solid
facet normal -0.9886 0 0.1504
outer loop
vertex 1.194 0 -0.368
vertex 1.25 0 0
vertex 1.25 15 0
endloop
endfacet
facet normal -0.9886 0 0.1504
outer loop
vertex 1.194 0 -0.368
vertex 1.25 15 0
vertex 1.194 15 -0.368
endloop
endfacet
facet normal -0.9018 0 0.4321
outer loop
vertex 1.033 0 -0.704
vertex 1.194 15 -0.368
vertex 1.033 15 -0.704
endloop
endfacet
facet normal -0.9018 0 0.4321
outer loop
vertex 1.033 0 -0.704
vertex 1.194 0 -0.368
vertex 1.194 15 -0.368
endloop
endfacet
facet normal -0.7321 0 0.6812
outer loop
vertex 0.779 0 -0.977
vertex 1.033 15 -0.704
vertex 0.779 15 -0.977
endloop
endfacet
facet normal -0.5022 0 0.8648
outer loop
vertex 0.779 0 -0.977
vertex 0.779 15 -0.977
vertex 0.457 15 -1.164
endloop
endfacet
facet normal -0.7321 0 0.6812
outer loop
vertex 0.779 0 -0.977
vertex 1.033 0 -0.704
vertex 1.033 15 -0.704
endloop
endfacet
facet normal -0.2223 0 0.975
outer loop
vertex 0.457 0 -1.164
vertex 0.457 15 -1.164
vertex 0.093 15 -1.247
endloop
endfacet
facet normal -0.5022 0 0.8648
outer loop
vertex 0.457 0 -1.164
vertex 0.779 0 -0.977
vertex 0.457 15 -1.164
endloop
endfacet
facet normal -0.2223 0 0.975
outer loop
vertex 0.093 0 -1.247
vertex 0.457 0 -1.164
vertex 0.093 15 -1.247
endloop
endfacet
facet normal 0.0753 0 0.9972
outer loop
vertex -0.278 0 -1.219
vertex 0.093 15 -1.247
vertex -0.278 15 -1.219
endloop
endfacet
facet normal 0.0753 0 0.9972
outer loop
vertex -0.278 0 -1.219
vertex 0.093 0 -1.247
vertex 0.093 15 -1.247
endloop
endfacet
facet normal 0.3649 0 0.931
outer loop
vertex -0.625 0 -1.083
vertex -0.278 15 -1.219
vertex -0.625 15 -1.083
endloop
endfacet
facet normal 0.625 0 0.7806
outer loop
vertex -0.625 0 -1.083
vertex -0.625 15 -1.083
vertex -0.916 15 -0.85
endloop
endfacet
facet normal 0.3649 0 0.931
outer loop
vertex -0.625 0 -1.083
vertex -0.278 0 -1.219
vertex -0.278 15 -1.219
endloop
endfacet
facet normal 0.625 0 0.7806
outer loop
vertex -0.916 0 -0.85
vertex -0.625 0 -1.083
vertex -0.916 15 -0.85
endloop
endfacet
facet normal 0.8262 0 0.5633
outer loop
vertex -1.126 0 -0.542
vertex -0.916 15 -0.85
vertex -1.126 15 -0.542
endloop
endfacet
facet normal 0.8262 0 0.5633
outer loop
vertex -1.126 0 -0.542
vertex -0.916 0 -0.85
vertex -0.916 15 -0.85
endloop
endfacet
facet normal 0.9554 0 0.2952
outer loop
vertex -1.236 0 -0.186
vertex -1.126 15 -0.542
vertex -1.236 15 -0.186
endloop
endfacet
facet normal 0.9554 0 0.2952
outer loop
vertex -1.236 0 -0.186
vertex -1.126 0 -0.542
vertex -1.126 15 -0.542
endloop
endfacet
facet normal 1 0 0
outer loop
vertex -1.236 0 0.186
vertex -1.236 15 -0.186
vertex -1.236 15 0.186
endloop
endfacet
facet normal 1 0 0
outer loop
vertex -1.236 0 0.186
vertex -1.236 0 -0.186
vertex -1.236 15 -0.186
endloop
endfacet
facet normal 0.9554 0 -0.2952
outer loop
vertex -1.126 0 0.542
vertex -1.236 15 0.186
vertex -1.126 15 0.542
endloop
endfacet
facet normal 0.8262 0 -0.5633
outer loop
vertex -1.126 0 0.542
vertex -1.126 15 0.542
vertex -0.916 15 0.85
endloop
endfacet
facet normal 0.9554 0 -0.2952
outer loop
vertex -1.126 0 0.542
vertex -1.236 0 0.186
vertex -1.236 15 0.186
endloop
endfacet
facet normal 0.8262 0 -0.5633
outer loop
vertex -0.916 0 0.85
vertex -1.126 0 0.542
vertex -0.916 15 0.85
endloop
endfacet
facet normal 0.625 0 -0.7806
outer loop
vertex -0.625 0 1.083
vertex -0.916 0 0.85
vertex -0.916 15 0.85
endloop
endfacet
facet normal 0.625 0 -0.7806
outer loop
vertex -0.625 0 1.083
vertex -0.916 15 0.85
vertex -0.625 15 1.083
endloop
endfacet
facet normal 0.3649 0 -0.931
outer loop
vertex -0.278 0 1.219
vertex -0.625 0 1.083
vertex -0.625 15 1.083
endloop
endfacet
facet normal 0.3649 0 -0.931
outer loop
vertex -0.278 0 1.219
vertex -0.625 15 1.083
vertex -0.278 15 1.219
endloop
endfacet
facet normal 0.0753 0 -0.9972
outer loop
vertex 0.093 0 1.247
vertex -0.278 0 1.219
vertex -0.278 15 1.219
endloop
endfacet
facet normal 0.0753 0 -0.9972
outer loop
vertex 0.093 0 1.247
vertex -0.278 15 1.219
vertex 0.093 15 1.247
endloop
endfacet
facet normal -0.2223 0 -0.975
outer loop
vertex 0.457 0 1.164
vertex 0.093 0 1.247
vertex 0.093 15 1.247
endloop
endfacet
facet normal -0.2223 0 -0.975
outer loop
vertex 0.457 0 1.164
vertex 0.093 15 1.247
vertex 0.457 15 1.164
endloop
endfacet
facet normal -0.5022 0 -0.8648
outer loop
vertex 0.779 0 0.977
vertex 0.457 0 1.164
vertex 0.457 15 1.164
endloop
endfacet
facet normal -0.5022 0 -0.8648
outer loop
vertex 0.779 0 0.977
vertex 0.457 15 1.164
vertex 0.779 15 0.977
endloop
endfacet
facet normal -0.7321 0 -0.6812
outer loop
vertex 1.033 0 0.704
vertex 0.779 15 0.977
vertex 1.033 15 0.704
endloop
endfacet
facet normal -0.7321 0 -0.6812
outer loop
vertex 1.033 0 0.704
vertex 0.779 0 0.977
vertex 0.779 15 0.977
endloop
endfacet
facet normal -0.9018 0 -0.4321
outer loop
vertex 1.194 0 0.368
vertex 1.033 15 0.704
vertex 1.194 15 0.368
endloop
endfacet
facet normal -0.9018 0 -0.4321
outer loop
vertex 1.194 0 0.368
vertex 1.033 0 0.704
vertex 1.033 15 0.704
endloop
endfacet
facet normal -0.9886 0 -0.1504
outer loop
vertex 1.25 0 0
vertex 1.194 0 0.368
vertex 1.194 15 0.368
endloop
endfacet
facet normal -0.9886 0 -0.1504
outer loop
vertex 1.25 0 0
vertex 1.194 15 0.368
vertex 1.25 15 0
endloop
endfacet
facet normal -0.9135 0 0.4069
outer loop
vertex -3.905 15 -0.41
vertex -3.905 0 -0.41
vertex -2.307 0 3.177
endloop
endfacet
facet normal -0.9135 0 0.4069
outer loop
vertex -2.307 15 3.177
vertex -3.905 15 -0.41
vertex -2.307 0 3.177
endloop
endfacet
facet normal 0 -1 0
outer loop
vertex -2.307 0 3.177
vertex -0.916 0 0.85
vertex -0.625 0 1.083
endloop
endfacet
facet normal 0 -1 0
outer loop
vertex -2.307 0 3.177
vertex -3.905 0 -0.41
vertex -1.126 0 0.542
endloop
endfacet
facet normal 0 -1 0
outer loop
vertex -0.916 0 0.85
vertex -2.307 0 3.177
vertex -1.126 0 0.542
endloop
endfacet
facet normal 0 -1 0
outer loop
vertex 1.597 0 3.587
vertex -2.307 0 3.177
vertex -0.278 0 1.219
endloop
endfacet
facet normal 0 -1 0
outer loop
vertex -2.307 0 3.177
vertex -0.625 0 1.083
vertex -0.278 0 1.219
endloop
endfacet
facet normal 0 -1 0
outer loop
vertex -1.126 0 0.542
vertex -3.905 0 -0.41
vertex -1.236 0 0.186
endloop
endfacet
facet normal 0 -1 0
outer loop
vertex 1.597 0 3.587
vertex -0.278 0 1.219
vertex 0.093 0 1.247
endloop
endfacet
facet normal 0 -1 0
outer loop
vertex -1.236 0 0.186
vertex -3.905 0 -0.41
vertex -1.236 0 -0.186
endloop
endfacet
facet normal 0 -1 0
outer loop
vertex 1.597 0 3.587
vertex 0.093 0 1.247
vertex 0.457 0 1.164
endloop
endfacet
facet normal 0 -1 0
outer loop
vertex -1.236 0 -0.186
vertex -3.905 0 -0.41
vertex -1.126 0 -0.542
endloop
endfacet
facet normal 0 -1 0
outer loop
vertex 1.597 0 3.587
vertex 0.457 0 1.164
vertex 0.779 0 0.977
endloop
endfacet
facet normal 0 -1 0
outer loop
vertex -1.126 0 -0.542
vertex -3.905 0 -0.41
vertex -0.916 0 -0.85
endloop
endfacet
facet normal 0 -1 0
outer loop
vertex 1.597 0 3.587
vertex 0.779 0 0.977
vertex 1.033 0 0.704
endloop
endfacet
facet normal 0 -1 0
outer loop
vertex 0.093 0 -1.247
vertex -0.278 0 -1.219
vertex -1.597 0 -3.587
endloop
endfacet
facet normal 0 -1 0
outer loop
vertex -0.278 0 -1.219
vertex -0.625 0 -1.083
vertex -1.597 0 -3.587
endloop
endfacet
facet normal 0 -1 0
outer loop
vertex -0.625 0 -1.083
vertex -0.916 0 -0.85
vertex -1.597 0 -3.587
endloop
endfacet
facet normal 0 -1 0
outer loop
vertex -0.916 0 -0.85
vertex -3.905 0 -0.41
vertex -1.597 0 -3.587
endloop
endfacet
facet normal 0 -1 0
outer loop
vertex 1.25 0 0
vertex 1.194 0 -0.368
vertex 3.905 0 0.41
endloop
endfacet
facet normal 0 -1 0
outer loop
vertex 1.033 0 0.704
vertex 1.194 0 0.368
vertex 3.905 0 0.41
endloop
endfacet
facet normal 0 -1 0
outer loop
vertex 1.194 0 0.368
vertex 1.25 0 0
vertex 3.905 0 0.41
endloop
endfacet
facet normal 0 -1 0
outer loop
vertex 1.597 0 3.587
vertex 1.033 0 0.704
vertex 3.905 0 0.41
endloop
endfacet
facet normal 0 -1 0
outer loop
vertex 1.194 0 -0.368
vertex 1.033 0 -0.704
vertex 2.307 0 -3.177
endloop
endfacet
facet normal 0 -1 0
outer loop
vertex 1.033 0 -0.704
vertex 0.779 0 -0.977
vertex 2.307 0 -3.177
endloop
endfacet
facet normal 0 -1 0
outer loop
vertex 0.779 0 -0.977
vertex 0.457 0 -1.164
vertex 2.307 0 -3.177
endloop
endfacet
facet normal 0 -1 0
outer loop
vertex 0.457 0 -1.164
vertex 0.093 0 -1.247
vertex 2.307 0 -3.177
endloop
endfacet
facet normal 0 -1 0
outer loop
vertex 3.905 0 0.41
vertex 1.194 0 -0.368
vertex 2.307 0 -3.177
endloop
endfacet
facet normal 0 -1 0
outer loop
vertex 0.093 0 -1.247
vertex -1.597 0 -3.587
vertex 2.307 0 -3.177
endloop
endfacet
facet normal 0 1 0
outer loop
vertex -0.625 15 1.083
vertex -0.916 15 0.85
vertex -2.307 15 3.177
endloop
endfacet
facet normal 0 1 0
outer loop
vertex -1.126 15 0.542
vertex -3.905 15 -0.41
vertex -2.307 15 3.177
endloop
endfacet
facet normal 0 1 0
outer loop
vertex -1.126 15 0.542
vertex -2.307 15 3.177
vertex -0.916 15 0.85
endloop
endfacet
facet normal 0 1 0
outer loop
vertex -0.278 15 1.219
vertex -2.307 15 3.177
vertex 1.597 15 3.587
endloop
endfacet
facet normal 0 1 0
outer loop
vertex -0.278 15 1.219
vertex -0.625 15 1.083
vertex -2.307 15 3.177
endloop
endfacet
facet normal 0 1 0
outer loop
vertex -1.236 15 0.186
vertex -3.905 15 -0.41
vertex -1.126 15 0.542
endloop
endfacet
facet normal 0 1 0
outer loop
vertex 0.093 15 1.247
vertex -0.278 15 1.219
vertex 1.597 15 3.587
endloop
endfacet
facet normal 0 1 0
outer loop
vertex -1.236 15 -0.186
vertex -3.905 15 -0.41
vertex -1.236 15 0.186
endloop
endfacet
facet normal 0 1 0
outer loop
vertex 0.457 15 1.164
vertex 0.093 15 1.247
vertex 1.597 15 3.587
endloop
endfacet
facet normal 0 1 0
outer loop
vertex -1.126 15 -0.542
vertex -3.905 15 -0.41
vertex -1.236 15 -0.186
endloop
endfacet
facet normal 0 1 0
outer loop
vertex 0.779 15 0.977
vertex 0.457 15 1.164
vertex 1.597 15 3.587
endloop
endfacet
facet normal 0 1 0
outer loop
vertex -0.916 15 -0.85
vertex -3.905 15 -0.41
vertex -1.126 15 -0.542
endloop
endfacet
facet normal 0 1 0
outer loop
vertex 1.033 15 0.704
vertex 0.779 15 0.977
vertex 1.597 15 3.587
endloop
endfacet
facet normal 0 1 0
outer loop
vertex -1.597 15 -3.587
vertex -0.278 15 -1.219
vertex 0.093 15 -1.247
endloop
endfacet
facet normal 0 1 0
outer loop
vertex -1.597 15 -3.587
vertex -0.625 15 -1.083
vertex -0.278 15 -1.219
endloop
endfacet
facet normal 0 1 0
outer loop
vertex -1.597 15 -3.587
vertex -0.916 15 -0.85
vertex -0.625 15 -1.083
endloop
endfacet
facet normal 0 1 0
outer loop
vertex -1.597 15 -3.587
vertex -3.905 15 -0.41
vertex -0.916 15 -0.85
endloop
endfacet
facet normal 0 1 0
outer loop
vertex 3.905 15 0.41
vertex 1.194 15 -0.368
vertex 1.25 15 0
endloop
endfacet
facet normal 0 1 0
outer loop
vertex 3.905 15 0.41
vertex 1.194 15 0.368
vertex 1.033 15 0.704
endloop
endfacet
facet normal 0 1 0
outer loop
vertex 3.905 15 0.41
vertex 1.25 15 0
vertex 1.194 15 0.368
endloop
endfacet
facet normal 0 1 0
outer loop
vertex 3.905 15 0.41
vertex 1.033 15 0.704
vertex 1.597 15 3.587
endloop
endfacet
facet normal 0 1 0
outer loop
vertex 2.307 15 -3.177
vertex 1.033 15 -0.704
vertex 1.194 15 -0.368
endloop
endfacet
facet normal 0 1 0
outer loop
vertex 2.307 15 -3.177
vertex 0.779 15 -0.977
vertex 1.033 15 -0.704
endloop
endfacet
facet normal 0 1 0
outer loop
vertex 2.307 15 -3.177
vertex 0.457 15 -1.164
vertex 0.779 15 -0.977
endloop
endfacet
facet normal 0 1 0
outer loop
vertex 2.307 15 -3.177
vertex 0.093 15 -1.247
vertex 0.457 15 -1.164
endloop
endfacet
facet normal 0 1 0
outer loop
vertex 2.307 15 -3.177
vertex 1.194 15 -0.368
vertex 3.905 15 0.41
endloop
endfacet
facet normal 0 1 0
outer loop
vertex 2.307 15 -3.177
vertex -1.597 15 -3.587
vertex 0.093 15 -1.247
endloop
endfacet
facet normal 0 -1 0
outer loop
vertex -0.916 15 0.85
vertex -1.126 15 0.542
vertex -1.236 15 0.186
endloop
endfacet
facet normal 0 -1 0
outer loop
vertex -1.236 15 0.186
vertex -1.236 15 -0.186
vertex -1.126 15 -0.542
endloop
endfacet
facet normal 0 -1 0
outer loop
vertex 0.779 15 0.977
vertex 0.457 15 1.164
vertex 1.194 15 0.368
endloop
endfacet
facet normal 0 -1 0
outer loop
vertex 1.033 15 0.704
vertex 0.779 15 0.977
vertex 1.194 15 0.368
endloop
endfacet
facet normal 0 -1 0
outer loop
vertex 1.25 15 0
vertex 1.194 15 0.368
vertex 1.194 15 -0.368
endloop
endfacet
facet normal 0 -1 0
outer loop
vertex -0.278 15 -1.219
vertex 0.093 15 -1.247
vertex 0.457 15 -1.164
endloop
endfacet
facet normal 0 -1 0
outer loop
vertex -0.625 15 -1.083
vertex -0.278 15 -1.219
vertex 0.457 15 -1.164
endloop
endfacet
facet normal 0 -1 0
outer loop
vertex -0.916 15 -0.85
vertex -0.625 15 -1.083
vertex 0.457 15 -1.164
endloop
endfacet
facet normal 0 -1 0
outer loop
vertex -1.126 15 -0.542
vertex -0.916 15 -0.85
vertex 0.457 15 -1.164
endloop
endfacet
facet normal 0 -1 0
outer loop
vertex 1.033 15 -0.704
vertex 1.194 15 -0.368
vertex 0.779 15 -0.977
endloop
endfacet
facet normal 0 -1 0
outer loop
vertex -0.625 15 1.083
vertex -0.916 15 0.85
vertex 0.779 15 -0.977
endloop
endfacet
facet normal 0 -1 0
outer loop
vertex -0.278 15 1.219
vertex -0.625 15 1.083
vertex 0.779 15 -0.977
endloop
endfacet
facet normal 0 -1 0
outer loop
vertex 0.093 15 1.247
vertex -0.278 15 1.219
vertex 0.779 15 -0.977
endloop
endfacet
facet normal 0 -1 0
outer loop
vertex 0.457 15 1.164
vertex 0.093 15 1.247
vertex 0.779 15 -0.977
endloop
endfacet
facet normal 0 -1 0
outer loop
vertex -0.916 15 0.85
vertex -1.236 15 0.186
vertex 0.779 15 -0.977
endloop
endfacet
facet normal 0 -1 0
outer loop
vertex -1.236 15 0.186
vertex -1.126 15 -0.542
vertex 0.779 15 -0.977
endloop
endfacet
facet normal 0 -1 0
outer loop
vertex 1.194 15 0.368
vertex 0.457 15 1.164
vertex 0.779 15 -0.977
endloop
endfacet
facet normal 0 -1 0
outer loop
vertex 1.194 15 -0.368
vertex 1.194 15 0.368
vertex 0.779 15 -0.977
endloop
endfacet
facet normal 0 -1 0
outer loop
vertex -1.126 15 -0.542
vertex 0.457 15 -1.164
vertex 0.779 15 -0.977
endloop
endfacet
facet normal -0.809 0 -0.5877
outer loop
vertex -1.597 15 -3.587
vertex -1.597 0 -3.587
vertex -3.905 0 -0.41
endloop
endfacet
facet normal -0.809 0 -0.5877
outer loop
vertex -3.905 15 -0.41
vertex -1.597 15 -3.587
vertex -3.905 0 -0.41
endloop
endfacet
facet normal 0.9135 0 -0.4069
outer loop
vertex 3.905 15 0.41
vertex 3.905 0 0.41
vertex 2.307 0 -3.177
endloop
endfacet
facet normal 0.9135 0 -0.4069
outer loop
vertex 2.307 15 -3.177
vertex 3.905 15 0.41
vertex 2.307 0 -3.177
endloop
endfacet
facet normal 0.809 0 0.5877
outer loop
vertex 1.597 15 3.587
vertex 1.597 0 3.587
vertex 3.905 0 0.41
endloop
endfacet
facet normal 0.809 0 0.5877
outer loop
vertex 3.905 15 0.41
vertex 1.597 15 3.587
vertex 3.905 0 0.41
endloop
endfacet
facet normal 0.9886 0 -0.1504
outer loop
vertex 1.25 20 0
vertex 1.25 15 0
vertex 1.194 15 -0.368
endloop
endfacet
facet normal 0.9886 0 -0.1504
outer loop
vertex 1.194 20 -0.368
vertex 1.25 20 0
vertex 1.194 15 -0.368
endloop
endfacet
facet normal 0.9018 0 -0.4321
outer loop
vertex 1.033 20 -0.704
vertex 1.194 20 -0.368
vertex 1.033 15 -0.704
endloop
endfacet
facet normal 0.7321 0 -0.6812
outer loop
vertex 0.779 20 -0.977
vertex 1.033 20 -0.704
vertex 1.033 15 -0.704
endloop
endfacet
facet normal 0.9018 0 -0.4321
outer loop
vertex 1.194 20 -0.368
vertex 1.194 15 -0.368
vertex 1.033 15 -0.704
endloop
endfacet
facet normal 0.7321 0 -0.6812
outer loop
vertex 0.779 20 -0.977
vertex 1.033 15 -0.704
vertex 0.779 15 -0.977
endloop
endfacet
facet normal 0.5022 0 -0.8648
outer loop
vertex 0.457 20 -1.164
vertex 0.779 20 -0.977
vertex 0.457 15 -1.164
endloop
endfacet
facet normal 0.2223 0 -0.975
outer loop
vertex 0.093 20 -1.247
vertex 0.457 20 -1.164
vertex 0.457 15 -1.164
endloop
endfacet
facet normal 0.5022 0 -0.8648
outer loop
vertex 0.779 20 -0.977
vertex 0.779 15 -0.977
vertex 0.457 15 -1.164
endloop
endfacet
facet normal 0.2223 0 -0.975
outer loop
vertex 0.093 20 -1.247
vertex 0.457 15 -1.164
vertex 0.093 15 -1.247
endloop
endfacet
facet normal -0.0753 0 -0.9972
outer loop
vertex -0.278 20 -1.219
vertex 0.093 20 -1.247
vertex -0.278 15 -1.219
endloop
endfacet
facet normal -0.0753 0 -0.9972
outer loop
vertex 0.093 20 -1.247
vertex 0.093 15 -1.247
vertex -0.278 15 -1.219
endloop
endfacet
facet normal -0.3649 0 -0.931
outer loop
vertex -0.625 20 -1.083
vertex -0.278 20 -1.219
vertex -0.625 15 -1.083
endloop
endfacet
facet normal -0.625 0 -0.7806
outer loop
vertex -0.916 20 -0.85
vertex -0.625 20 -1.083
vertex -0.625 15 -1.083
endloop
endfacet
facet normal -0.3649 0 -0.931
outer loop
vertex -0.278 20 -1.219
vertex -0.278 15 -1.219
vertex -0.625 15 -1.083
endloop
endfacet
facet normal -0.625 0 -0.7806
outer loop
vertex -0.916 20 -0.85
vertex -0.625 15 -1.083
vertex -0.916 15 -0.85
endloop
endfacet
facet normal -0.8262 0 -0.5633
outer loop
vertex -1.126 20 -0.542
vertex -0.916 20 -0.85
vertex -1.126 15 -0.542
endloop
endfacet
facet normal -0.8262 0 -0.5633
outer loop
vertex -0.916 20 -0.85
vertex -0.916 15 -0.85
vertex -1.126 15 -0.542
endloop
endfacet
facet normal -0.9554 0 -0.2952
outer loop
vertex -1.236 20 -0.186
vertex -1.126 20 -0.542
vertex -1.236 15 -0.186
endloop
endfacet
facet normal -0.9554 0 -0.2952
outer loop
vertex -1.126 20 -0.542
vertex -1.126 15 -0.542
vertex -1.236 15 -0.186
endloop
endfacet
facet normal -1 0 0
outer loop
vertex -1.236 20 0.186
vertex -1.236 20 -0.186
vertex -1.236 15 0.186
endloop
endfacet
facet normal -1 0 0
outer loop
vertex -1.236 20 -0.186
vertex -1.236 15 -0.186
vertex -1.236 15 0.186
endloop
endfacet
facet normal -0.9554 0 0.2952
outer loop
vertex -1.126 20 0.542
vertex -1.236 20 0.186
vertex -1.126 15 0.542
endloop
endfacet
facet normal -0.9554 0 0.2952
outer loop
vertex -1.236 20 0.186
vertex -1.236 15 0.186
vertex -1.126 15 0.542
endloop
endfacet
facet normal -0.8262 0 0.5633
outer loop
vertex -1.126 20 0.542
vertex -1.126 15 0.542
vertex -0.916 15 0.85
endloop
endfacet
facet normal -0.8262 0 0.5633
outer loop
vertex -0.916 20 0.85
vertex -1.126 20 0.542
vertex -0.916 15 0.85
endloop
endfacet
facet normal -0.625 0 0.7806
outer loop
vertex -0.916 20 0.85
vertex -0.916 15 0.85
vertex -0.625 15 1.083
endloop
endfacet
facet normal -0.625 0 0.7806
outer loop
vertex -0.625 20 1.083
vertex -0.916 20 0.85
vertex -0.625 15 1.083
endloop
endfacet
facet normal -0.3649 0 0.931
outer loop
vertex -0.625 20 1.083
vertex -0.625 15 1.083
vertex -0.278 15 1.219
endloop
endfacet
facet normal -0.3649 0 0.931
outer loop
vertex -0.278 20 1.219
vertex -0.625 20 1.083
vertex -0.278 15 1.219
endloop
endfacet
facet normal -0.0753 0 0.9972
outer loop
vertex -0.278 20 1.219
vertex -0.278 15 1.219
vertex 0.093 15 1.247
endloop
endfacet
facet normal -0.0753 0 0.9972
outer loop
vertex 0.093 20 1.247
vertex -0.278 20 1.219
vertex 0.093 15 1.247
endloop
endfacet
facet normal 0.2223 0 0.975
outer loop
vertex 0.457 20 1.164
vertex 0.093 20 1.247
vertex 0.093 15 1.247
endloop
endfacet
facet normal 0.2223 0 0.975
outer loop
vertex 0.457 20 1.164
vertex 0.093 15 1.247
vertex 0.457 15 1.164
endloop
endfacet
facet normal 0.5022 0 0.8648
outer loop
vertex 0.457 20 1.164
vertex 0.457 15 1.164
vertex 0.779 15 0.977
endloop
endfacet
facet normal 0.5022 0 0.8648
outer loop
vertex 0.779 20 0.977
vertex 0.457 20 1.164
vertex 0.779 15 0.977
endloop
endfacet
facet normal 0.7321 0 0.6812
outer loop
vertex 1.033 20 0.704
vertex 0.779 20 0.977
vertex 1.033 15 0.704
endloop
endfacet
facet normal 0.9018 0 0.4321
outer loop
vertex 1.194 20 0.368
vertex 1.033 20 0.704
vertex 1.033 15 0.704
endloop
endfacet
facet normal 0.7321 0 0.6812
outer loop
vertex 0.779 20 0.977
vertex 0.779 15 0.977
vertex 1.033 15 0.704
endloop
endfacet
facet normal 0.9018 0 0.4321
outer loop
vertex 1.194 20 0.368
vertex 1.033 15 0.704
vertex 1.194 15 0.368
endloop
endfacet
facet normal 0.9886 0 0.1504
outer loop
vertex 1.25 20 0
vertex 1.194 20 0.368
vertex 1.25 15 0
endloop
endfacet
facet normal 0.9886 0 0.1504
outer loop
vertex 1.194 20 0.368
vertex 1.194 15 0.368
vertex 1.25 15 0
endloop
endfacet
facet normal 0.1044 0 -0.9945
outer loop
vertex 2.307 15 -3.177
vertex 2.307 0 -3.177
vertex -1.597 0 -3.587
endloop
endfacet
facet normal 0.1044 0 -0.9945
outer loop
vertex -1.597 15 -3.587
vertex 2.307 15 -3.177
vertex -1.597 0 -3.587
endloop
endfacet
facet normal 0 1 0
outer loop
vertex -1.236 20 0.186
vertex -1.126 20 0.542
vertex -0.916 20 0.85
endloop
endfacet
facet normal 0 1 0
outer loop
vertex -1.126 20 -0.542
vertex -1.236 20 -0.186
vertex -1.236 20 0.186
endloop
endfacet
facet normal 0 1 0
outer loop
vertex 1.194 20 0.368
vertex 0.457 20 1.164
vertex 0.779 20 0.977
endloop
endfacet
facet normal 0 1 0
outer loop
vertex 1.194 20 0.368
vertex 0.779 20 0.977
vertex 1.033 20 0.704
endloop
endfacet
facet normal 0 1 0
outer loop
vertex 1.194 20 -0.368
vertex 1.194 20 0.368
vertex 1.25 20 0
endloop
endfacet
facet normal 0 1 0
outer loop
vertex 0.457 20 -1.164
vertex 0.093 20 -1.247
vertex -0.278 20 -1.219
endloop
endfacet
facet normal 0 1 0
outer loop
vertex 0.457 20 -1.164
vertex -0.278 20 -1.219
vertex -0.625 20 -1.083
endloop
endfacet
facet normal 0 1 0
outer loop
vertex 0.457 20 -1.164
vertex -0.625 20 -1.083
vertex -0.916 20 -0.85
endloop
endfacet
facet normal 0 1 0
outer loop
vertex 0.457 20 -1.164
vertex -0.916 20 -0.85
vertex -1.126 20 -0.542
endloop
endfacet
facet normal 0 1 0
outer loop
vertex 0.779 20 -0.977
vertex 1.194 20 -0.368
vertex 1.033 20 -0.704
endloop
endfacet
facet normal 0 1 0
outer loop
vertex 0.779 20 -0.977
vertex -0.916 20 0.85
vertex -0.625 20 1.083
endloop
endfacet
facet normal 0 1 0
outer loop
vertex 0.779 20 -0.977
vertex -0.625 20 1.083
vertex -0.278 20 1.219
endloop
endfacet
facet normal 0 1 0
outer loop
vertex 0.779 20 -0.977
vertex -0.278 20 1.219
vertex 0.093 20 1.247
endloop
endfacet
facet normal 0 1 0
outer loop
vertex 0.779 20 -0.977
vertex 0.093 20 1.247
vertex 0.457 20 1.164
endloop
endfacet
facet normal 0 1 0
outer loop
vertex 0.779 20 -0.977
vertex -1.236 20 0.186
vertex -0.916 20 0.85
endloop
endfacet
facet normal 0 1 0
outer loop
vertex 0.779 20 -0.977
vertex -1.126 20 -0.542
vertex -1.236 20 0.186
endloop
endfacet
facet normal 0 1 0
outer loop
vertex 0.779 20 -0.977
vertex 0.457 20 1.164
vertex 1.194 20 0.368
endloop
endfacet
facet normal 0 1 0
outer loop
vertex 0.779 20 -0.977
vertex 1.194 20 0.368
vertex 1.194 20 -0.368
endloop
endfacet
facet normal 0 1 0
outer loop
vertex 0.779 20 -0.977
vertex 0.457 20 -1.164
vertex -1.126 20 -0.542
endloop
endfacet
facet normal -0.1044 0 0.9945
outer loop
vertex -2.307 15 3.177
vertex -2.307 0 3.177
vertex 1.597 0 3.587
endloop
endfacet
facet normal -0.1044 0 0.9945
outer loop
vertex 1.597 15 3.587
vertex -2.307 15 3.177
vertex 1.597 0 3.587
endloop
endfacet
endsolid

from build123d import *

# Parameters (mm, degrees)
SKETCH1_R           = 1.25
BOSS_EXTRUDE1_DEPTH = 15
SKETCH2_R           = 1.25
BOSS_EXTRUDE2_DEPTH = 5


with BuildPart() as part:
    # Sketch1 → Boss-Extrude1 (new body)
    with BuildSketch(Plane(origin=(0, 0, 0), x_dir=(1, 0, 0), z_dir=(0, 1, 0))):
        Polygon((2.307316277, 3.176622058), (-1.597377262, 3.586505539), (-3.904693539, 0.409883482), (-2.307316277, -3.176622058), (1.597377262, -3.586505539), (3.904693539, -0.409883482), align=None)
        Circle(SKETCH1_R, mode=Mode.SUBTRACT)
    extrude(amount=BOSS_EXTRUDE1_DEPTH)


with BuildPart() as body_2:
    # Sketch2 → Boss-Extrude2 (new body)
    with BuildSketch(Plane(origin=(0, 15, 0), x_dir=(1, 0, 0), z_dir=(0, 1, 0))):
        Circle(SKETCH2_R)
    extrude(amount=BOSS_EXTRUDE2_DEPTH)


solid = Compound([part.part, body_2.part])
